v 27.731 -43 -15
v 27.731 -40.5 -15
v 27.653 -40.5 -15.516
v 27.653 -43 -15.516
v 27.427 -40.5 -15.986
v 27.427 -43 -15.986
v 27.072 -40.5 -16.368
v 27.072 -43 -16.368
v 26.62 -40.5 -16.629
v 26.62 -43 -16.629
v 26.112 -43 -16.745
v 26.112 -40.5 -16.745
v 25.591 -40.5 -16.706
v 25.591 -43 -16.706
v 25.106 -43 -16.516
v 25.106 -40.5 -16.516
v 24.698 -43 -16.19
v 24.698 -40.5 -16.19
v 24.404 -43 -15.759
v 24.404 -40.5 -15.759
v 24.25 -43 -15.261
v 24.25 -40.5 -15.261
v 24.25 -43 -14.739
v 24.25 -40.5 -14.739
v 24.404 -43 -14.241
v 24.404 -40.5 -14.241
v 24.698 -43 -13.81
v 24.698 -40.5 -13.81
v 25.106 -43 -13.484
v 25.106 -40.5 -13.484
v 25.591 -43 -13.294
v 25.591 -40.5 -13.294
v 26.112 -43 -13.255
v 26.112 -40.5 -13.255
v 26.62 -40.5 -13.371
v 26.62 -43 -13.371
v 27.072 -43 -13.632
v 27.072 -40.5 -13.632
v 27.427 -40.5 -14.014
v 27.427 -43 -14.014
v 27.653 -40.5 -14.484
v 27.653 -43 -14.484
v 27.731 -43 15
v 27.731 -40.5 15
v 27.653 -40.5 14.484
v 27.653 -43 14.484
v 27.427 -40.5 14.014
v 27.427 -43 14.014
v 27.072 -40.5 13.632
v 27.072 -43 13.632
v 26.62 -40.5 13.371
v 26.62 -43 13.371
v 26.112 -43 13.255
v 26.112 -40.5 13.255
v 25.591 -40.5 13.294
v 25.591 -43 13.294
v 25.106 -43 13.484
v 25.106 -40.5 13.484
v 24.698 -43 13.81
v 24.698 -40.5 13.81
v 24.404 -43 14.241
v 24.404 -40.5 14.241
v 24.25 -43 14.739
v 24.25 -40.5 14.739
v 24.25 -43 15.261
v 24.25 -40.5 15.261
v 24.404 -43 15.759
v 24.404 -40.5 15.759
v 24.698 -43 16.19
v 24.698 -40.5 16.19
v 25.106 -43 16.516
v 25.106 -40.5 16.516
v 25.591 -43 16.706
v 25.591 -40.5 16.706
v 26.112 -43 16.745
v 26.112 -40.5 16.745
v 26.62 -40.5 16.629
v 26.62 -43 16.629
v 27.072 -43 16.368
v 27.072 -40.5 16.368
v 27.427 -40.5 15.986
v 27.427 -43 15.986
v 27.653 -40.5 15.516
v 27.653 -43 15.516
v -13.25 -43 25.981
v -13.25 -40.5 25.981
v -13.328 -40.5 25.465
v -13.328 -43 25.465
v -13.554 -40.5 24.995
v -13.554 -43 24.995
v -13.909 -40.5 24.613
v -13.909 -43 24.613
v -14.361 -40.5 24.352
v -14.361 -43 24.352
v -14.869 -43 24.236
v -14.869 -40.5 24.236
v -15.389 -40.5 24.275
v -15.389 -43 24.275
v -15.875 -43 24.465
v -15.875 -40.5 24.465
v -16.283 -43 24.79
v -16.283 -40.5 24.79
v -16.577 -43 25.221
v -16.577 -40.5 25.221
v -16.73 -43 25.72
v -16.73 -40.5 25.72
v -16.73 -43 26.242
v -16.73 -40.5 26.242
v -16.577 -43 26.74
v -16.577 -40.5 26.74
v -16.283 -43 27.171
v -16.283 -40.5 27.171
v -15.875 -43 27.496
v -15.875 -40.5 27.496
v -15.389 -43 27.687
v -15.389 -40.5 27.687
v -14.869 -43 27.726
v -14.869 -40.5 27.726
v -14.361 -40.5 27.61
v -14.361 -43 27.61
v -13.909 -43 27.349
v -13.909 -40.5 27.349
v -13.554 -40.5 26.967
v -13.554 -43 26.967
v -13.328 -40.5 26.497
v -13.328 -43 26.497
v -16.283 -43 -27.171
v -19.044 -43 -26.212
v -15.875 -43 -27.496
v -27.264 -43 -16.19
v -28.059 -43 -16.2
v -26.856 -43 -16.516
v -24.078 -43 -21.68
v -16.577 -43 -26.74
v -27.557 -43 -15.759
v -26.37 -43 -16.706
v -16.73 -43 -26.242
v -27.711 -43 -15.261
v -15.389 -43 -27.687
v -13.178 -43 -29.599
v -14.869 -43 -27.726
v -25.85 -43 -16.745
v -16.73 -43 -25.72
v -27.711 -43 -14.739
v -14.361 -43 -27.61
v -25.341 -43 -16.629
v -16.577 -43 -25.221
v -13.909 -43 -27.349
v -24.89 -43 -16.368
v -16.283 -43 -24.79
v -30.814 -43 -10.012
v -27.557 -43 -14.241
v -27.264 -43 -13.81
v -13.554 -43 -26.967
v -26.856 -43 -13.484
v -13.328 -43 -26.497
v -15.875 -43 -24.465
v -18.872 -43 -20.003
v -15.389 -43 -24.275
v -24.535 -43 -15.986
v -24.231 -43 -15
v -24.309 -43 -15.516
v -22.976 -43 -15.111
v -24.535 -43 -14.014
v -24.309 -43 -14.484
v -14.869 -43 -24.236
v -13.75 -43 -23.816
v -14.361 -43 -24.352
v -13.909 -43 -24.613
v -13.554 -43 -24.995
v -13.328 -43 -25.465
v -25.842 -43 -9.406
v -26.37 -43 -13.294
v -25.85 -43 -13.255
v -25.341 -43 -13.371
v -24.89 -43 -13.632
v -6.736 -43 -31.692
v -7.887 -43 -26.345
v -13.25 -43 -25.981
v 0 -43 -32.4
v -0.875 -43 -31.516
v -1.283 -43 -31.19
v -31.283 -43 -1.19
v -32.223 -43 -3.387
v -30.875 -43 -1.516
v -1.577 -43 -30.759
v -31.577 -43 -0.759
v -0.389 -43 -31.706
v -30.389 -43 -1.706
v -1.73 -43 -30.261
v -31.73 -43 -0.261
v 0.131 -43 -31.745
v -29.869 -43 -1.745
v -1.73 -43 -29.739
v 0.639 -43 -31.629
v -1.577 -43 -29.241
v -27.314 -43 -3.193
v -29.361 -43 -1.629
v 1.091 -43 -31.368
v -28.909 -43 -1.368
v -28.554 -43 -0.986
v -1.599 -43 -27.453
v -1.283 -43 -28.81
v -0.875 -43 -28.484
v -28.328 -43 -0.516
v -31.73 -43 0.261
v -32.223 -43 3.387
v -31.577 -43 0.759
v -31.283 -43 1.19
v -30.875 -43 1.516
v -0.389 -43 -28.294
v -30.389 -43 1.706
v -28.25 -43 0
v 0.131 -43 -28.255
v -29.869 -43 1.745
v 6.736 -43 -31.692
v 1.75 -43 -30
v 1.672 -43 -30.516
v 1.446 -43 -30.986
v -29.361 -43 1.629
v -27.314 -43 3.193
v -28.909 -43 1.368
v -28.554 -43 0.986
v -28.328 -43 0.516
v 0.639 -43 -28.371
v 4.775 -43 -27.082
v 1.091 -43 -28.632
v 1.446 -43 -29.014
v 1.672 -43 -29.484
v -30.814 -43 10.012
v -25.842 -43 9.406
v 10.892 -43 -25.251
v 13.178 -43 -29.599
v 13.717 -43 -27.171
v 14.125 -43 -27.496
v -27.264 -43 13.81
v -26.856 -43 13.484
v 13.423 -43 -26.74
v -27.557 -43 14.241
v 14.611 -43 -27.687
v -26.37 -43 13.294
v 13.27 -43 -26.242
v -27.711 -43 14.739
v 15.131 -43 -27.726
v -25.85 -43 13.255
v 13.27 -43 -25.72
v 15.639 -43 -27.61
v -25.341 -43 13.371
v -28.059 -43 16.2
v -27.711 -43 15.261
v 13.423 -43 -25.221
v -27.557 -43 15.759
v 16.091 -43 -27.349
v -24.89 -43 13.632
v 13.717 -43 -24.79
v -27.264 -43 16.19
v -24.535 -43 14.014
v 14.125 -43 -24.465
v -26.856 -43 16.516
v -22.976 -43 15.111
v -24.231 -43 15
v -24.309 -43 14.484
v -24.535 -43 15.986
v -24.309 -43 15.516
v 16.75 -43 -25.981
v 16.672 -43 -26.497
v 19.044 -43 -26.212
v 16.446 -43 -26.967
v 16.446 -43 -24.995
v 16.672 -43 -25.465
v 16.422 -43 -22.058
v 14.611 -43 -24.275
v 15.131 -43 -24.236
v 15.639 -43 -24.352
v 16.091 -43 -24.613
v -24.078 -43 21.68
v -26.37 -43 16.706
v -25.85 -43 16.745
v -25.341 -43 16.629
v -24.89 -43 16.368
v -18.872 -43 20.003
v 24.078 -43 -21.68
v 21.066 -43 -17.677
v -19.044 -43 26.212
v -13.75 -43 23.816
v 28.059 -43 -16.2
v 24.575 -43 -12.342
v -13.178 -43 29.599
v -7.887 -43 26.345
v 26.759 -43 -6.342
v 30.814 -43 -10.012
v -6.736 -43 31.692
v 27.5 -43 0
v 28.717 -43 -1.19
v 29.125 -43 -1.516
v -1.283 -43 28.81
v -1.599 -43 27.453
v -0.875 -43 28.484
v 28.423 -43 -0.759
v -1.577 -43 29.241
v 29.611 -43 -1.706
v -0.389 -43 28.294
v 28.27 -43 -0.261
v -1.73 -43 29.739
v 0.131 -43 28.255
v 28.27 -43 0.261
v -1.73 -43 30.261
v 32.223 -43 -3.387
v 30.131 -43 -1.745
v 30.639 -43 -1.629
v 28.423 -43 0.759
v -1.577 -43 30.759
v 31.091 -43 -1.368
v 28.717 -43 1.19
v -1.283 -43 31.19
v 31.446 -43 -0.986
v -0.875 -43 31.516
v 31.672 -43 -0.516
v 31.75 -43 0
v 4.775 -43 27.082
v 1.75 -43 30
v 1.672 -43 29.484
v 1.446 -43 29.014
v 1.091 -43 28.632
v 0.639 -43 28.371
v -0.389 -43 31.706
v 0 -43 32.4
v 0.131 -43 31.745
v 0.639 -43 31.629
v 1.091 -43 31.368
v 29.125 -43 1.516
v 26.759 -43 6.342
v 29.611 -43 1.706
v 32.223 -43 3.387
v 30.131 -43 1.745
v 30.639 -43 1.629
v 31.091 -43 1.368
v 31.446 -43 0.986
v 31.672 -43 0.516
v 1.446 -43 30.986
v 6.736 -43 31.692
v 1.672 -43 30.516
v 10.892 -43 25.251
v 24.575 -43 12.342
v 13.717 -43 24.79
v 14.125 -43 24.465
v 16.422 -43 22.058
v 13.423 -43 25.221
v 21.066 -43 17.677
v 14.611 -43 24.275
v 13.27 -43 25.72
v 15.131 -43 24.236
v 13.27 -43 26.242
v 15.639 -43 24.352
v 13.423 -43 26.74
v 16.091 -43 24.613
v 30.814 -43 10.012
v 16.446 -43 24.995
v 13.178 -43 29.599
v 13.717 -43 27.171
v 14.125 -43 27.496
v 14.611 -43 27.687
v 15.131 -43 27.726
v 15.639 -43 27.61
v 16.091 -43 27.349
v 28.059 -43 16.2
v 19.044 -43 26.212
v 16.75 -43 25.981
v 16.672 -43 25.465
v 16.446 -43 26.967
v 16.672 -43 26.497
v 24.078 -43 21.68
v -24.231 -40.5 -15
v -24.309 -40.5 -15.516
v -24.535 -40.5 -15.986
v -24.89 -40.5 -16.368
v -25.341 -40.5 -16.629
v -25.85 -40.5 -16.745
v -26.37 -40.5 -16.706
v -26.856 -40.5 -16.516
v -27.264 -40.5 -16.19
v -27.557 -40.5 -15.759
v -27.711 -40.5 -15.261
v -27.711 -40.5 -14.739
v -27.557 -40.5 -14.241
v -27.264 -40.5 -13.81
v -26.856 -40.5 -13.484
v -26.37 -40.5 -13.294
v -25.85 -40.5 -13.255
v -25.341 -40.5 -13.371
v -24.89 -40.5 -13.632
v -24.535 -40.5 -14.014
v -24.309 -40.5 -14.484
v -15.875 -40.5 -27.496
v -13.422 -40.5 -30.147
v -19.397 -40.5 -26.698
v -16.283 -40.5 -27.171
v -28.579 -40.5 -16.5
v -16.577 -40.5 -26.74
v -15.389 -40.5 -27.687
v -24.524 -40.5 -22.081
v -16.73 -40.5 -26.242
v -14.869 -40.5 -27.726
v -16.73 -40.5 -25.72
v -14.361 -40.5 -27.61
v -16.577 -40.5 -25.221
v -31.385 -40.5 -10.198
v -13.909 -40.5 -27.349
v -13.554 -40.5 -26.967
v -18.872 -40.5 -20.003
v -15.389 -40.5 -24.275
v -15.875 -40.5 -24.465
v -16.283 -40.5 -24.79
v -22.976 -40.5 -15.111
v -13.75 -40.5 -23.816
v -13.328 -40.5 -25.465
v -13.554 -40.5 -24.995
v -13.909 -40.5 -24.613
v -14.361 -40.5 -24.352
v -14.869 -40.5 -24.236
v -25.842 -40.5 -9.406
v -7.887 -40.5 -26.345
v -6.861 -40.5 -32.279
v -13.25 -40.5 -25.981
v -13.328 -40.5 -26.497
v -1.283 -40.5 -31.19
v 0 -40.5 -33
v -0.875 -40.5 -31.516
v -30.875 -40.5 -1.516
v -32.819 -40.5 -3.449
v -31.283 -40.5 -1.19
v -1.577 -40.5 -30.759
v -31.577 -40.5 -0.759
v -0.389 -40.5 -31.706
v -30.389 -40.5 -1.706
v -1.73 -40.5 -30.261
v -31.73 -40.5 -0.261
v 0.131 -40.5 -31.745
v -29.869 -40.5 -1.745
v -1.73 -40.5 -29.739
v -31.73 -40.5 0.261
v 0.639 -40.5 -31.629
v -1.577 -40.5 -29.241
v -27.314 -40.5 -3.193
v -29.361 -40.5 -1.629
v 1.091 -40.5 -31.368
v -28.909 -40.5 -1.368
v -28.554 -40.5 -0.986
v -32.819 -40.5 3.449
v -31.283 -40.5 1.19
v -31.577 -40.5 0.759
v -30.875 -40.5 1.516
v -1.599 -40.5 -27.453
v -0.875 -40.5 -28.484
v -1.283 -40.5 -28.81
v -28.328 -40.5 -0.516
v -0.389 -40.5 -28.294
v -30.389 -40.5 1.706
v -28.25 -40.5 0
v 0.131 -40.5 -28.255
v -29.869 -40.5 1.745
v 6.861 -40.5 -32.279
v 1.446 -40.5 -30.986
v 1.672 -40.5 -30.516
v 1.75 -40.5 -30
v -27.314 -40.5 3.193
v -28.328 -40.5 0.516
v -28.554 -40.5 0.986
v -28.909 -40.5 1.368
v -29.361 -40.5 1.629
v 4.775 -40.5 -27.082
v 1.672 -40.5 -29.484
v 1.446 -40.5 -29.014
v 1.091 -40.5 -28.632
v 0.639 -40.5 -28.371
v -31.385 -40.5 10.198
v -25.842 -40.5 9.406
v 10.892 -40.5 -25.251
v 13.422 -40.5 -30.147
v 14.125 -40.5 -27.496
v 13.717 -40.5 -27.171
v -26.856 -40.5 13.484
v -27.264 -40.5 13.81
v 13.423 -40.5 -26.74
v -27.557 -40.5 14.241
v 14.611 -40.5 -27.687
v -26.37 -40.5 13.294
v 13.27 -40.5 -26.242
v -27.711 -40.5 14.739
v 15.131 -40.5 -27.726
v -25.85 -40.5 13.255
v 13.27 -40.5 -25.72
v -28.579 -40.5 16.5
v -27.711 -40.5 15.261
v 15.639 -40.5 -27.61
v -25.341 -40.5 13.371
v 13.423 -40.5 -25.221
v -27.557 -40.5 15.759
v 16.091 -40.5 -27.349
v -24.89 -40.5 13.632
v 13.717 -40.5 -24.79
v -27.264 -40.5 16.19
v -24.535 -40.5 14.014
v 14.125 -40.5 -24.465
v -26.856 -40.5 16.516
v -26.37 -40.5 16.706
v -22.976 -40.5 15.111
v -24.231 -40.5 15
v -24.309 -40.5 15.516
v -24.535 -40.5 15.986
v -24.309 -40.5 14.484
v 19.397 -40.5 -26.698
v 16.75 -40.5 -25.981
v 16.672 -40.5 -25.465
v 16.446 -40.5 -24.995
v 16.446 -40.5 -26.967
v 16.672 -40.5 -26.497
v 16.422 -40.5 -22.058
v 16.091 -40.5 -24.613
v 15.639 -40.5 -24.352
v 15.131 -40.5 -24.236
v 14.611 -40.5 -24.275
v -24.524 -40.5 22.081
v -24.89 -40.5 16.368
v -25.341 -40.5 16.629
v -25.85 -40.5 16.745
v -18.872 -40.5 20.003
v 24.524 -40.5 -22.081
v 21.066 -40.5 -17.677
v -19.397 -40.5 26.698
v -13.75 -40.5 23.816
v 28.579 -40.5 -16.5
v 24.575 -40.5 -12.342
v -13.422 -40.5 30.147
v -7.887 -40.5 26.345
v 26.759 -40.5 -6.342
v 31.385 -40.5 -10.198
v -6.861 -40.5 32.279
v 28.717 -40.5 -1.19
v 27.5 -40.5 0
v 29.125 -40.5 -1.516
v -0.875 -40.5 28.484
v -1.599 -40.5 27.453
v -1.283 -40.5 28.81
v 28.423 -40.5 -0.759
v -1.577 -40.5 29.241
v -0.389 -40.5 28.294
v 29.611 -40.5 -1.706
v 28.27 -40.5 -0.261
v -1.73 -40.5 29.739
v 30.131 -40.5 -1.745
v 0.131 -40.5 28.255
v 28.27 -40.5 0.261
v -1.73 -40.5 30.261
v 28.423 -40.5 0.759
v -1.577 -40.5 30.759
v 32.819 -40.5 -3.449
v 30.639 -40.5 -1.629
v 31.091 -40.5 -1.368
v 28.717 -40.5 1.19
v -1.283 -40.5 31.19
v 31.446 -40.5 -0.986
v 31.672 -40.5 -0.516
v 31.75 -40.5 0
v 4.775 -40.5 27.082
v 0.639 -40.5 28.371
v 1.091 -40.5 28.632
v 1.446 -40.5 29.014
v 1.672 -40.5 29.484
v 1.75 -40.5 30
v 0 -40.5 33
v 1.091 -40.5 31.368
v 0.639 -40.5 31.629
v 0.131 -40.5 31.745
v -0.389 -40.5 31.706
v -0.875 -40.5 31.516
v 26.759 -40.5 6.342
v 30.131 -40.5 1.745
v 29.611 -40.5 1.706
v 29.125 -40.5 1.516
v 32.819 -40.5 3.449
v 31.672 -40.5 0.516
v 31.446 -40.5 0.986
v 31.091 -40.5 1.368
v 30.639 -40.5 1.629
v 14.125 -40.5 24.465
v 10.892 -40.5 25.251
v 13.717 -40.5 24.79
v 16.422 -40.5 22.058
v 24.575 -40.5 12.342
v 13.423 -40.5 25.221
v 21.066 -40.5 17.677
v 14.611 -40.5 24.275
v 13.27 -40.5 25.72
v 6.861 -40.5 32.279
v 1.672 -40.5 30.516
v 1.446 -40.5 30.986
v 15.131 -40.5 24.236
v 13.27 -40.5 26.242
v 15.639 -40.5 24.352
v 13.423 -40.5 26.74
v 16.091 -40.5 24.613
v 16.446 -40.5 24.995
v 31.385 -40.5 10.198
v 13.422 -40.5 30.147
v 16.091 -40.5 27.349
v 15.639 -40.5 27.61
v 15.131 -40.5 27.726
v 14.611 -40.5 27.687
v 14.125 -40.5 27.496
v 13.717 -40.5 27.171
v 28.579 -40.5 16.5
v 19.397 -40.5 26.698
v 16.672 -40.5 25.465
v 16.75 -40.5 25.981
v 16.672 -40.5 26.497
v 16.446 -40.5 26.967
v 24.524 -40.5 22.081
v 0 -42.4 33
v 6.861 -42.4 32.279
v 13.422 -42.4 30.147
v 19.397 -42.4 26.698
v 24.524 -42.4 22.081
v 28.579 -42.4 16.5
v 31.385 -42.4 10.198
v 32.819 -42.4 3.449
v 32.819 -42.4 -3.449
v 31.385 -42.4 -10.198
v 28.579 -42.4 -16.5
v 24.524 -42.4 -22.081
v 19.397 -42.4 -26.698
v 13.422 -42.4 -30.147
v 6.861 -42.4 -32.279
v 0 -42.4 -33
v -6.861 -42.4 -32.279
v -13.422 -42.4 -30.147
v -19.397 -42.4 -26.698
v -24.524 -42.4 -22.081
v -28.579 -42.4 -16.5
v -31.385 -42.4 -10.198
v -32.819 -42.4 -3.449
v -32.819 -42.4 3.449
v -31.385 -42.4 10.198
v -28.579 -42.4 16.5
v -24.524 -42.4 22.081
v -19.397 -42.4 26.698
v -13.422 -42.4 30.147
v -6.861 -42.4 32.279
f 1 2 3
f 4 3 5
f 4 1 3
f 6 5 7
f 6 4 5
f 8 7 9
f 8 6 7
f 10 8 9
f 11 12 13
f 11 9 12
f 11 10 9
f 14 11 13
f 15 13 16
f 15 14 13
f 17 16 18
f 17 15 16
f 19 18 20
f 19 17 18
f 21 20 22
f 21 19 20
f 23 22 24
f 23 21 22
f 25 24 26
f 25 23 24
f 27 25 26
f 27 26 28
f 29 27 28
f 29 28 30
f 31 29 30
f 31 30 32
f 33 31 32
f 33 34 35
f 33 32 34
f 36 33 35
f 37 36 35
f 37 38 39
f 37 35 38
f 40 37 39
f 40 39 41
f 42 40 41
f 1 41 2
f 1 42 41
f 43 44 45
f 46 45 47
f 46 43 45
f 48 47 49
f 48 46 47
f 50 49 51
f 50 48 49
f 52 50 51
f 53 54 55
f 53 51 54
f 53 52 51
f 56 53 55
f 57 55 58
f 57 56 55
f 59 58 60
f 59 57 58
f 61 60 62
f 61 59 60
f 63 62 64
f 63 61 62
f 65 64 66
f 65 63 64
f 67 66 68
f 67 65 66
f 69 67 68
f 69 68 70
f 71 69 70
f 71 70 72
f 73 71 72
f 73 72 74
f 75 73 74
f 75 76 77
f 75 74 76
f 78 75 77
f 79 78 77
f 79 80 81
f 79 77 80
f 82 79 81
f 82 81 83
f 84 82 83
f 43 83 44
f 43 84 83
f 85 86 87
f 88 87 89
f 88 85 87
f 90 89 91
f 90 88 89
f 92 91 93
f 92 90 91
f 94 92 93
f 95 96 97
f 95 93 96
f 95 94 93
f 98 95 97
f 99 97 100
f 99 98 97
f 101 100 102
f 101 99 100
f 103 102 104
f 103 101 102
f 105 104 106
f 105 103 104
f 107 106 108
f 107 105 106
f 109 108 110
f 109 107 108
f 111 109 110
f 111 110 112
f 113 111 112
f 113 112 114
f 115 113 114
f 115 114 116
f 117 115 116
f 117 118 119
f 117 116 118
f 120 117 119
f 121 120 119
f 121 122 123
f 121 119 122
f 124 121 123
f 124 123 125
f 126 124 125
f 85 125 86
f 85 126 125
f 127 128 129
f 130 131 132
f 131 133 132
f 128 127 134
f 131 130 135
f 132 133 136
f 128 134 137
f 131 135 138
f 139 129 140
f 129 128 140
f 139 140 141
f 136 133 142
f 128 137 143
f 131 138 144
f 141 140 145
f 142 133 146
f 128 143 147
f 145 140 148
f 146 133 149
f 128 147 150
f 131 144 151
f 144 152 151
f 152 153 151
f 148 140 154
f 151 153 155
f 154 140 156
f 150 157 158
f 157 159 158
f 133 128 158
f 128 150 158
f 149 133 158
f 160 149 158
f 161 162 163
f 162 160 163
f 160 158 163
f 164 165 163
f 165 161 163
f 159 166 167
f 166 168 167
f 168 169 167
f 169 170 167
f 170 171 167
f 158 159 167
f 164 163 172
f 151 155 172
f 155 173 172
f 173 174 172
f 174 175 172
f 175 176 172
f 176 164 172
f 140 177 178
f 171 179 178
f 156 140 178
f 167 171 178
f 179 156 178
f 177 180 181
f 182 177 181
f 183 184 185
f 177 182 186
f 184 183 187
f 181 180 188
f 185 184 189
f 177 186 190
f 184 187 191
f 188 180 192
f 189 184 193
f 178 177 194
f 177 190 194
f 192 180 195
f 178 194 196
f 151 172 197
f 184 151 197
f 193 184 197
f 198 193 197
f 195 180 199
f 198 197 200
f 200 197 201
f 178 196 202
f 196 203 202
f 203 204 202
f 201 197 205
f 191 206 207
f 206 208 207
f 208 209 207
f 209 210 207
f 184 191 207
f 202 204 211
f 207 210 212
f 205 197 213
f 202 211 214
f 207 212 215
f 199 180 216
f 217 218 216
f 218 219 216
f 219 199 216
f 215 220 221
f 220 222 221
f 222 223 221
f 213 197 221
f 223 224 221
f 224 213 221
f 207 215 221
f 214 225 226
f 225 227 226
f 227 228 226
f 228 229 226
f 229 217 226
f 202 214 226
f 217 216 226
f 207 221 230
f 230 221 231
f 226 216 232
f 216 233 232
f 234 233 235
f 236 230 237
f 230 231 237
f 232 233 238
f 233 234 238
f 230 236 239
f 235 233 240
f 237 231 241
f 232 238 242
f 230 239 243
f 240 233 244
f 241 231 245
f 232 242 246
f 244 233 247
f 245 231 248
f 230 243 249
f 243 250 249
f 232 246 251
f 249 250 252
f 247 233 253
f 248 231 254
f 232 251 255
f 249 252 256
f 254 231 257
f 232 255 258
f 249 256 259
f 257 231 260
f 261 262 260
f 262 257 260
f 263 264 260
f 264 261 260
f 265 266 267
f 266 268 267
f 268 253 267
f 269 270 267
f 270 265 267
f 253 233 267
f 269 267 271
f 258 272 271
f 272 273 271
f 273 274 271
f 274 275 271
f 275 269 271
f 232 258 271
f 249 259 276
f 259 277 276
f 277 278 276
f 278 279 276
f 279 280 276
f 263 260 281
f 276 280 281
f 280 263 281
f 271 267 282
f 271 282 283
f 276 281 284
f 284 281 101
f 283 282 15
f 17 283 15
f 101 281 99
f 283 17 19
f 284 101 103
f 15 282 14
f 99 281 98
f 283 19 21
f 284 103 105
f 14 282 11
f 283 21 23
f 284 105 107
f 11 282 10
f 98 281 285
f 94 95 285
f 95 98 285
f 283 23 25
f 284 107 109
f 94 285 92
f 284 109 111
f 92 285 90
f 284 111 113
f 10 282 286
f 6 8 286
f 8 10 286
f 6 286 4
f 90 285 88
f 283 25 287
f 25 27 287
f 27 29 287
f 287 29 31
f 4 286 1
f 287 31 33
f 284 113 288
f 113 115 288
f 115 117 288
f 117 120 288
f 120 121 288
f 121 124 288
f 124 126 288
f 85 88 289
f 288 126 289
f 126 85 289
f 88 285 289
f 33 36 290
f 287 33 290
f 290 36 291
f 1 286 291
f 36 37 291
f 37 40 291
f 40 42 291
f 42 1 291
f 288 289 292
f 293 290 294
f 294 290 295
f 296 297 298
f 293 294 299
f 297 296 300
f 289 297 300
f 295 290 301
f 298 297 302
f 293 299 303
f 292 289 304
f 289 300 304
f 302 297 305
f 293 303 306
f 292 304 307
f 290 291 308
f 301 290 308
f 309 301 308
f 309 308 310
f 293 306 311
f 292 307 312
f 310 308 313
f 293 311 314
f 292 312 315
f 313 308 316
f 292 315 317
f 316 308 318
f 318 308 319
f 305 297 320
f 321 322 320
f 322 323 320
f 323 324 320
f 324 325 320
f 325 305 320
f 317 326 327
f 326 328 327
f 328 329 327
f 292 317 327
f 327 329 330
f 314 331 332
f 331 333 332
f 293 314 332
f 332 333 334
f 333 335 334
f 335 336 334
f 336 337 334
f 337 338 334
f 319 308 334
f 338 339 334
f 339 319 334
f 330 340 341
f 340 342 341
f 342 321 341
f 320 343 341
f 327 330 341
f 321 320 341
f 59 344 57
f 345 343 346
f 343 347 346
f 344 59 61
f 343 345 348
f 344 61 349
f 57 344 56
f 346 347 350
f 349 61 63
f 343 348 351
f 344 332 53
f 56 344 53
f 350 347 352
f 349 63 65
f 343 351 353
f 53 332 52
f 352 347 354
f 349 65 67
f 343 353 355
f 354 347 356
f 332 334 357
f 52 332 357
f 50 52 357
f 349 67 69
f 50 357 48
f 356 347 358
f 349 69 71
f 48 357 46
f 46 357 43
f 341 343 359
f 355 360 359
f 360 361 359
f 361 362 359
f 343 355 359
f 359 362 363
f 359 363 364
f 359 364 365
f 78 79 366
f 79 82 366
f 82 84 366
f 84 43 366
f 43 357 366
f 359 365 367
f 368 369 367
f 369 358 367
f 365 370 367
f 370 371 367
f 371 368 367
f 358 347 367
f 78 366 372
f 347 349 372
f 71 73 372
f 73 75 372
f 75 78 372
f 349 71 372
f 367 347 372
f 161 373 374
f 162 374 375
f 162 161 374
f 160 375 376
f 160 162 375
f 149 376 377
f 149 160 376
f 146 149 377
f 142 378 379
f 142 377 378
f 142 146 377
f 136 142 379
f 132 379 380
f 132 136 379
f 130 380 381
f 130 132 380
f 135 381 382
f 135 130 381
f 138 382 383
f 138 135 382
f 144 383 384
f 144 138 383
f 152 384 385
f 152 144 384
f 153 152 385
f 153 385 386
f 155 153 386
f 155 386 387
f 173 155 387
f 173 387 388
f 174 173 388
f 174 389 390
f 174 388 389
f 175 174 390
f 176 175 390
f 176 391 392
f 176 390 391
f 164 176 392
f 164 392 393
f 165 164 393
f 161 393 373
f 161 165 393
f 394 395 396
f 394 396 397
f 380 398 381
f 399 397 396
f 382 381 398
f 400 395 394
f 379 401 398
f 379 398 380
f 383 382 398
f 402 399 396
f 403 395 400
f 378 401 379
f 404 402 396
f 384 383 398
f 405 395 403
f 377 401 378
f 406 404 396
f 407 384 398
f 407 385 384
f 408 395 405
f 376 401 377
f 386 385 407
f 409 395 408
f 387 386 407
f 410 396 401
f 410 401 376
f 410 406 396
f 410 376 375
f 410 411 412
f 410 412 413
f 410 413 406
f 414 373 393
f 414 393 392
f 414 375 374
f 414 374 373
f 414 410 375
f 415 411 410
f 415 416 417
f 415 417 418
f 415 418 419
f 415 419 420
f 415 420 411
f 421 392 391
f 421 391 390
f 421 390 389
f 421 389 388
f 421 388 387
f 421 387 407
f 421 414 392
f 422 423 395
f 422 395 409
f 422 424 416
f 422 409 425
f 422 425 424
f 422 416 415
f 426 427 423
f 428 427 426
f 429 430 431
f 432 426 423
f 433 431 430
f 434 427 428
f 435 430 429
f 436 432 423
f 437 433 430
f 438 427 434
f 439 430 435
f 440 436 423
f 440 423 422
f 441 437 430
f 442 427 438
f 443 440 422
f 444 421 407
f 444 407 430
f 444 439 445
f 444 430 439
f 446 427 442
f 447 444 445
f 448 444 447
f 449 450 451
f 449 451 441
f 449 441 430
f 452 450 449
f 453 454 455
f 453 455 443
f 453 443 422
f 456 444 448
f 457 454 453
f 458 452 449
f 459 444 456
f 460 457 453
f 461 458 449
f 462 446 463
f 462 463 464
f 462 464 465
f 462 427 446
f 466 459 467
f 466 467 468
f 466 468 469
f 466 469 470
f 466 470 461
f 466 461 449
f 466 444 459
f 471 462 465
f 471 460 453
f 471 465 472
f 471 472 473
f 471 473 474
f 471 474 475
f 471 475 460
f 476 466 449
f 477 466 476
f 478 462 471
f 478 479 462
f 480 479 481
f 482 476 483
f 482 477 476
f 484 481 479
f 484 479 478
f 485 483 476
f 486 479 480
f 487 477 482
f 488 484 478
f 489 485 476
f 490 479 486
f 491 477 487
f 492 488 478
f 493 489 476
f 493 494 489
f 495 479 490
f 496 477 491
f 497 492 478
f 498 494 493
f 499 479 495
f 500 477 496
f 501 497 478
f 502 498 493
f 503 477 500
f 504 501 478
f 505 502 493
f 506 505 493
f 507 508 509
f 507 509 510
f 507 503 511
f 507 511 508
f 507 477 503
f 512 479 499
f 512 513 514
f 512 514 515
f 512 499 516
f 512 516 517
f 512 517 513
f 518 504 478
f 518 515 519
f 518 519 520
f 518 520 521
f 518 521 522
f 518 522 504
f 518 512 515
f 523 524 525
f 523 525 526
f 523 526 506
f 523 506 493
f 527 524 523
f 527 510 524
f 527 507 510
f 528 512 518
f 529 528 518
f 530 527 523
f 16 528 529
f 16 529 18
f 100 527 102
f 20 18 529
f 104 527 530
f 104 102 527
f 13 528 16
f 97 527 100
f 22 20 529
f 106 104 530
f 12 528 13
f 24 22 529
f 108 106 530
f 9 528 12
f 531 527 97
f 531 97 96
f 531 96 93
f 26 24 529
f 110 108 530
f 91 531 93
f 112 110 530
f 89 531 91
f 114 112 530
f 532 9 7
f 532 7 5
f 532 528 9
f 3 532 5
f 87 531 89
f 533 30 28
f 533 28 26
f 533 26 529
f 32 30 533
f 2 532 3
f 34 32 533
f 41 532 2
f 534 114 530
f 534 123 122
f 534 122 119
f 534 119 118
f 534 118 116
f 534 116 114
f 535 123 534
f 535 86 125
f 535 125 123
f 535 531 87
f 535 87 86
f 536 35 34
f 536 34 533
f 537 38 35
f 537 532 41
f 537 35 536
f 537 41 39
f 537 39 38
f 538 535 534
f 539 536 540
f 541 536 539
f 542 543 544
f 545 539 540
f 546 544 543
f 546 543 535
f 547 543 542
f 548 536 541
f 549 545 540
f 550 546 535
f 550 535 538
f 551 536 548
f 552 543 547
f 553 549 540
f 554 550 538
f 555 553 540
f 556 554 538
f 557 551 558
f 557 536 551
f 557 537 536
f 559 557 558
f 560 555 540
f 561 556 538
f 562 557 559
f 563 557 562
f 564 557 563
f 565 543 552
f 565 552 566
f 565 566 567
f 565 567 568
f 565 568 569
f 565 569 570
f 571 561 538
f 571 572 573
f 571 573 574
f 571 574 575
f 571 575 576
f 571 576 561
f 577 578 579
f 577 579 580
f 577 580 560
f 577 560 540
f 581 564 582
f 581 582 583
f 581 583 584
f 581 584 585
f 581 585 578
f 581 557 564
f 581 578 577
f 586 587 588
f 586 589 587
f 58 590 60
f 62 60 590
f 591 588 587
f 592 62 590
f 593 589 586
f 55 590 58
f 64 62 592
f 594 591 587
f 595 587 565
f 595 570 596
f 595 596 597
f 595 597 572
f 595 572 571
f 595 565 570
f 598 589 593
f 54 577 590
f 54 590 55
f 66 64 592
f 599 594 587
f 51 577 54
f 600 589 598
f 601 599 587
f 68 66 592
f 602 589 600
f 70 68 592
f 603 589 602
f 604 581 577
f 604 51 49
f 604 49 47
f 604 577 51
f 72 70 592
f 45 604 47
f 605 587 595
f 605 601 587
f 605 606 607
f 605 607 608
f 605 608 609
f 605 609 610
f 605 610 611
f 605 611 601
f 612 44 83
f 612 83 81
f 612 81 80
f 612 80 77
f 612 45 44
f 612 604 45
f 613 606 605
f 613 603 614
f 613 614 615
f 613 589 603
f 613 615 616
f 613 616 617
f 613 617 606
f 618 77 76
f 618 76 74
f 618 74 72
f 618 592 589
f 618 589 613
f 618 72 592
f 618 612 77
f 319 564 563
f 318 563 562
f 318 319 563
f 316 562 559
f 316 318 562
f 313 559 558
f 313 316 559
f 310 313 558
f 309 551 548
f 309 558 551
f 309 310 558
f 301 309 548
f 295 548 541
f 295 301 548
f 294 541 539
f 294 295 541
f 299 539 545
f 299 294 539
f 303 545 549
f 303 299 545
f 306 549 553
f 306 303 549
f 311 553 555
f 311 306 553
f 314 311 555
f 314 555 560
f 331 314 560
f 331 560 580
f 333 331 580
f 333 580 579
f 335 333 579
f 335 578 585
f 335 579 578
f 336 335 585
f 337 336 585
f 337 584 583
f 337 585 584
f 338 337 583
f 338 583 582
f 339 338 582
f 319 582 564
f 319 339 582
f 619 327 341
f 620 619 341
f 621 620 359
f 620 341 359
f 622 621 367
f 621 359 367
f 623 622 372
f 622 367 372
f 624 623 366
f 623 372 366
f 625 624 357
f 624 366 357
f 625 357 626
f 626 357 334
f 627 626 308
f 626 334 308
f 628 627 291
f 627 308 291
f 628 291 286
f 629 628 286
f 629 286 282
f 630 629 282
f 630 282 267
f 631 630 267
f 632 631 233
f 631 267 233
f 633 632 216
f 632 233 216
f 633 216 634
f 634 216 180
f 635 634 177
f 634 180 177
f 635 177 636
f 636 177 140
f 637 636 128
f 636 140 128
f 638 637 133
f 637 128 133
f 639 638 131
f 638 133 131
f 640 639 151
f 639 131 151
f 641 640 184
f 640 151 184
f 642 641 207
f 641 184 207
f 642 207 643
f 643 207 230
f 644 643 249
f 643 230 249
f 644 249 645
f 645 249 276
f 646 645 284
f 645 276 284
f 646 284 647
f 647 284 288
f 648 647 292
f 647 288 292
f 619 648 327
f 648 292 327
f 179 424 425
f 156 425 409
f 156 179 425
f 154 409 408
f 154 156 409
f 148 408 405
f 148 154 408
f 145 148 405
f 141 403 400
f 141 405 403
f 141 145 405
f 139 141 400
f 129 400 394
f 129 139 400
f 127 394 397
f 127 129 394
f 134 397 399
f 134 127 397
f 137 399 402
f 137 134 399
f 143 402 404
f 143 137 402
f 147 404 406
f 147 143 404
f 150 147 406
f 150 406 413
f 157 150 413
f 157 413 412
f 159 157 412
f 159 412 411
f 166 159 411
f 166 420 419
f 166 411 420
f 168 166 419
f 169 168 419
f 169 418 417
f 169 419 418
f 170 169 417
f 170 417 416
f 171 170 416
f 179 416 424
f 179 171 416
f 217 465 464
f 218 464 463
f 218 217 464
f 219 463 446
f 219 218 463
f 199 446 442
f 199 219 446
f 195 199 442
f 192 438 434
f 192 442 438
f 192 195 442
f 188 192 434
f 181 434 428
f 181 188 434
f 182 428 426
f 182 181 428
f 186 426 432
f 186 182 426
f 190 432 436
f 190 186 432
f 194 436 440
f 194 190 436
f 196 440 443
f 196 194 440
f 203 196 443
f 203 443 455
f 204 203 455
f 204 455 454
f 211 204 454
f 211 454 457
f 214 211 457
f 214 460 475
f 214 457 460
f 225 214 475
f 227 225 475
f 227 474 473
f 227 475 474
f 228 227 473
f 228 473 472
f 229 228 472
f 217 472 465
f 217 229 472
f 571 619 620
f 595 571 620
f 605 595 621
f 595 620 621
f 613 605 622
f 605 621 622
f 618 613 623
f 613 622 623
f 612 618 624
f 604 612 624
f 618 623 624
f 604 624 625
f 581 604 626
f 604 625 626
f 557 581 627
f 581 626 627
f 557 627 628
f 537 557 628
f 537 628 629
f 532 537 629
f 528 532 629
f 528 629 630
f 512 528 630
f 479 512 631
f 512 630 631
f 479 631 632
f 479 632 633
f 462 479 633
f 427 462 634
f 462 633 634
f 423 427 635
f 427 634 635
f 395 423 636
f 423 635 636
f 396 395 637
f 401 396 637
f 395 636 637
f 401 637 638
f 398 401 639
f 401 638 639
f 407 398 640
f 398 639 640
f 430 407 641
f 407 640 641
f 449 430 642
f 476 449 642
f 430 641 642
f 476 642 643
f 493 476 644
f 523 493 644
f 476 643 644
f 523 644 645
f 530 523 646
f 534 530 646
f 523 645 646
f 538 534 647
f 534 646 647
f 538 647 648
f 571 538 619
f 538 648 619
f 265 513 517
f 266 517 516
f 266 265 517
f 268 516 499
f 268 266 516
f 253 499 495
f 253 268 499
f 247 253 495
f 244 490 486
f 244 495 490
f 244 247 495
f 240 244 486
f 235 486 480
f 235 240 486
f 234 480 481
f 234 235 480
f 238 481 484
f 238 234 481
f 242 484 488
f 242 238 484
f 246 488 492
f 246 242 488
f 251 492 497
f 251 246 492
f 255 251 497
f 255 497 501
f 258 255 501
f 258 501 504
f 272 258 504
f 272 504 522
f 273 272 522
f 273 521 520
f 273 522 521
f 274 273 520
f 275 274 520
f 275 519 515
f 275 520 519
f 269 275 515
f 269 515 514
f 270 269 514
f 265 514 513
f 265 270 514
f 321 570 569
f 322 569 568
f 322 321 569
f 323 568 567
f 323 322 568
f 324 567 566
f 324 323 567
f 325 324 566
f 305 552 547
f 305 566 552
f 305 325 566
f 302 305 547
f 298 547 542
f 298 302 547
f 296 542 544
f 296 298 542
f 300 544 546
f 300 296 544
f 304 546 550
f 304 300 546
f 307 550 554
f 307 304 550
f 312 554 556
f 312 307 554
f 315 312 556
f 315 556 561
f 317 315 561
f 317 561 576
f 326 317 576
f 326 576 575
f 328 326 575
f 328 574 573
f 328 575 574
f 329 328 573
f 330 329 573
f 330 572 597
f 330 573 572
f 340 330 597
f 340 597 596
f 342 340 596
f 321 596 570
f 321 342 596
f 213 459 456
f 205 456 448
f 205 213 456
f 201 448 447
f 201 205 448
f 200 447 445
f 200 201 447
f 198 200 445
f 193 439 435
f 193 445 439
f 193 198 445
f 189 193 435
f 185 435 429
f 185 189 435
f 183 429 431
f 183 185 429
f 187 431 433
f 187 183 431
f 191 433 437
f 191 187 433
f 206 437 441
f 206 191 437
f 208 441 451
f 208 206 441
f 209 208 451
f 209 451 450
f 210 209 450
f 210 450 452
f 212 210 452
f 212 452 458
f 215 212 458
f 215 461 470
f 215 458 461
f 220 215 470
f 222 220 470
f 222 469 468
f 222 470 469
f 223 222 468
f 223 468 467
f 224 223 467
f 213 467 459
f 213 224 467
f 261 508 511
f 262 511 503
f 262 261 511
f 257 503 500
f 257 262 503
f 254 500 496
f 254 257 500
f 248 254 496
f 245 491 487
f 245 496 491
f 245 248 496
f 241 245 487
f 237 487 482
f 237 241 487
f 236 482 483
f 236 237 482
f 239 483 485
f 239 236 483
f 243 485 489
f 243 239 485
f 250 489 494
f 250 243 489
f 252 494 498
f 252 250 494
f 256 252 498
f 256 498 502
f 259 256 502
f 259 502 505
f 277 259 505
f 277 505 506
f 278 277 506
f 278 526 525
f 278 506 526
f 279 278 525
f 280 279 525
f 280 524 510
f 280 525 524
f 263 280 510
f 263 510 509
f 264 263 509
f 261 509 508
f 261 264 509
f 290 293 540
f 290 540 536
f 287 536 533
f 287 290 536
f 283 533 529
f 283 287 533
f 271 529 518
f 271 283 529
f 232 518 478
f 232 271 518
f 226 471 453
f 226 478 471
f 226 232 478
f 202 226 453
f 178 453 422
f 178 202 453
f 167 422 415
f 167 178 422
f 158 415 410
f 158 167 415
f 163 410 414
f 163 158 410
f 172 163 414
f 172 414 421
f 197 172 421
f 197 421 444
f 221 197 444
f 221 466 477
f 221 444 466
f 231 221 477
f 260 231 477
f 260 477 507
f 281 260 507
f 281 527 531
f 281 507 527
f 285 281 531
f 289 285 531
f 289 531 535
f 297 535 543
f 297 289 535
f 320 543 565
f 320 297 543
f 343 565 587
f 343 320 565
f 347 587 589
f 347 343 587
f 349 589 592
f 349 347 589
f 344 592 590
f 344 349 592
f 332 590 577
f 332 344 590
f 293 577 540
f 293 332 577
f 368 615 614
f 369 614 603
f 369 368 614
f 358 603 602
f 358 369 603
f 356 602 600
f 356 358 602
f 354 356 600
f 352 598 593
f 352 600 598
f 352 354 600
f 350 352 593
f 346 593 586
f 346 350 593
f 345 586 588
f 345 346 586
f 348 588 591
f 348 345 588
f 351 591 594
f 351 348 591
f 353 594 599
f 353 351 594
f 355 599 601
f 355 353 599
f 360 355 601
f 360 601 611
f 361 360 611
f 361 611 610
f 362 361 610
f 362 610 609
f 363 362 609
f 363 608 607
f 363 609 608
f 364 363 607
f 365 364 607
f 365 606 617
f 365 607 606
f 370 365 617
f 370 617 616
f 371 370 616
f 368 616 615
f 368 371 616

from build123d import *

# Parameters (mm, degrees)
BASISTEIL_BECHER_1_START       = -43
BASISTEIL_BECHER_1_OUTLINE_R   = 32.5
BASISTEIL_BECHER_1_OUTLINE_R_2 = 1.75
BASISTEIL_BECHER_1_OUTLINE_R_3 = 27.5
BASISTEIL_BECHER_1_DEPTH       = 3
CUT_EXTRUDE1_START             = -0.5
SKETCH1_R                      = 32.5
CUT_EXTRUDE1_DEPTH             = 0.5
BOSS_EXTRUDE1_START            = -2.5
SKETCH3_R                      = 33
SKETCH3_R_2                    = 32.5
BOSS_EXTRUDE1_DEPTH            = 2.5
CHAMFER1_SIZE                  = 0.6


# Read off the part's stored shape, not the designer's step: Basisteil-Becher-1
with BuildPart() as part:
    # Basisteil-Becher-1 outline → Basisteil-Becher-1 (new body)
    with BuildSketch(Plane(origin=(0, 0, 0), x_dir=(1, 0, 0), z_dir=(0, 1, 0)).offset(BASISTEIL_BECHER_1_START)):
        Circle(BASISTEIL_BECHER_1_OUTLINE_R)
        with Locations((-15, -25.980762114)):
            Circle(BASISTEIL_BECHER_1_OUTLINE_R_2, mode=Mode.SUBTRACT)
        with Locations((-25.980762114, -15)):
            Circle(BASISTEIL_BECHER_1_OUTLINE_R_2, mode=Mode.SUBTRACT)
        with Locations((0, -30)):
            Circle(BASISTEIL_BECHER_1_OUTLINE_R_2, mode=Mode.SUBTRACT)
        with Locations((15, -25.980762114)):
            Circle(BASISTEIL_BECHER_1_OUTLINE_R_2, mode=Mode.SUBTRACT)
        with Locations((25.980762114, -15)):
            Circle(BASISTEIL_BECHER_1_OUTLINE_R_2, mode=Mode.SUBTRACT)
        with Locations((-30, 0)):
            Circle(BASISTEIL_BECHER_1_OUTLINE_R_2, mode=Mode.SUBTRACT)
        with Locations((-25.980762114, 15)):
            Circle(BASISTEIL_BECHER_1_OUTLINE_R_2, mode=Mode.SUBTRACT)
        with Locations((-15, 25.980762114)):
            Circle(BASISTEIL_BECHER_1_OUTLINE_R_2, mode=Mode.SUBTRACT)
        Circle(BASISTEIL_BECHER_1_OUTLINE_R_3, mode=Mode.SUBTRACT)
        with Locations((30, 0)):
            Circle(BASISTEIL_BECHER_1_OUTLINE_R_2, mode=Mode.SUBTRACT)
        with Locations((25.980762114, 15)):
            Circle(BASISTEIL_BECHER_1_OUTLINE_R_2, mode=Mode.SUBTRACT)
        with Locations((0, 30)):
            Circle(BASISTEIL_BECHER_1_OUTLINE_R_2, mode=Mode.SUBTRACT)
        with Locations((15, 25.980762114)):
            Circle(BASISTEIL_BECHER_1_OUTLINE_R_2, mode=Mode.SUBTRACT)
    extrude(amount=BASISTEIL_BECHER_1_DEPTH)

    # Sketch1 → Cut-Extrude1 (cut)
    with BuildSketch(Plane(origin=(0, -40, 0), x_dir=(1, 0, 0), z_dir=(0, 1, 0)).offset(CUT_EXTRUDE1_START)):
        with Locations(Location((0, 0, 0), (0, 0, 270))):
            Circle(SKETCH1_R)
    extrude(amount=CUT_EXTRUDE1_DEPTH, mode=Mode.SUBTRACT)

    # Sketch3 → Boss-Extrude1 (add)
    with BuildSketch(Plane(origin=(0, -40.5, 0), x_dir=(1, 0, 0), z_dir=(0, 1, 0)).offset(BOSS_EXTRUDE1_START)):
        with Locations(Location((0, 0, 0), (0, 0, 270))):
            Circle(SKETCH3_R)
        Circle(SKETCH3_R_2, mode=Mode.SUBTRACT)
    extrude(amount=BOSS_EXTRUDE1_DEPTH)

    # Chamfer1
    chamfer1_edges = [part.edges().sort_by_distance(p)[0] for p in [
        (0, -43, -33),
    ]]
    chamfer(chamfer1_edges, length=CHAMFER1_SIZE)


solid = part.part
